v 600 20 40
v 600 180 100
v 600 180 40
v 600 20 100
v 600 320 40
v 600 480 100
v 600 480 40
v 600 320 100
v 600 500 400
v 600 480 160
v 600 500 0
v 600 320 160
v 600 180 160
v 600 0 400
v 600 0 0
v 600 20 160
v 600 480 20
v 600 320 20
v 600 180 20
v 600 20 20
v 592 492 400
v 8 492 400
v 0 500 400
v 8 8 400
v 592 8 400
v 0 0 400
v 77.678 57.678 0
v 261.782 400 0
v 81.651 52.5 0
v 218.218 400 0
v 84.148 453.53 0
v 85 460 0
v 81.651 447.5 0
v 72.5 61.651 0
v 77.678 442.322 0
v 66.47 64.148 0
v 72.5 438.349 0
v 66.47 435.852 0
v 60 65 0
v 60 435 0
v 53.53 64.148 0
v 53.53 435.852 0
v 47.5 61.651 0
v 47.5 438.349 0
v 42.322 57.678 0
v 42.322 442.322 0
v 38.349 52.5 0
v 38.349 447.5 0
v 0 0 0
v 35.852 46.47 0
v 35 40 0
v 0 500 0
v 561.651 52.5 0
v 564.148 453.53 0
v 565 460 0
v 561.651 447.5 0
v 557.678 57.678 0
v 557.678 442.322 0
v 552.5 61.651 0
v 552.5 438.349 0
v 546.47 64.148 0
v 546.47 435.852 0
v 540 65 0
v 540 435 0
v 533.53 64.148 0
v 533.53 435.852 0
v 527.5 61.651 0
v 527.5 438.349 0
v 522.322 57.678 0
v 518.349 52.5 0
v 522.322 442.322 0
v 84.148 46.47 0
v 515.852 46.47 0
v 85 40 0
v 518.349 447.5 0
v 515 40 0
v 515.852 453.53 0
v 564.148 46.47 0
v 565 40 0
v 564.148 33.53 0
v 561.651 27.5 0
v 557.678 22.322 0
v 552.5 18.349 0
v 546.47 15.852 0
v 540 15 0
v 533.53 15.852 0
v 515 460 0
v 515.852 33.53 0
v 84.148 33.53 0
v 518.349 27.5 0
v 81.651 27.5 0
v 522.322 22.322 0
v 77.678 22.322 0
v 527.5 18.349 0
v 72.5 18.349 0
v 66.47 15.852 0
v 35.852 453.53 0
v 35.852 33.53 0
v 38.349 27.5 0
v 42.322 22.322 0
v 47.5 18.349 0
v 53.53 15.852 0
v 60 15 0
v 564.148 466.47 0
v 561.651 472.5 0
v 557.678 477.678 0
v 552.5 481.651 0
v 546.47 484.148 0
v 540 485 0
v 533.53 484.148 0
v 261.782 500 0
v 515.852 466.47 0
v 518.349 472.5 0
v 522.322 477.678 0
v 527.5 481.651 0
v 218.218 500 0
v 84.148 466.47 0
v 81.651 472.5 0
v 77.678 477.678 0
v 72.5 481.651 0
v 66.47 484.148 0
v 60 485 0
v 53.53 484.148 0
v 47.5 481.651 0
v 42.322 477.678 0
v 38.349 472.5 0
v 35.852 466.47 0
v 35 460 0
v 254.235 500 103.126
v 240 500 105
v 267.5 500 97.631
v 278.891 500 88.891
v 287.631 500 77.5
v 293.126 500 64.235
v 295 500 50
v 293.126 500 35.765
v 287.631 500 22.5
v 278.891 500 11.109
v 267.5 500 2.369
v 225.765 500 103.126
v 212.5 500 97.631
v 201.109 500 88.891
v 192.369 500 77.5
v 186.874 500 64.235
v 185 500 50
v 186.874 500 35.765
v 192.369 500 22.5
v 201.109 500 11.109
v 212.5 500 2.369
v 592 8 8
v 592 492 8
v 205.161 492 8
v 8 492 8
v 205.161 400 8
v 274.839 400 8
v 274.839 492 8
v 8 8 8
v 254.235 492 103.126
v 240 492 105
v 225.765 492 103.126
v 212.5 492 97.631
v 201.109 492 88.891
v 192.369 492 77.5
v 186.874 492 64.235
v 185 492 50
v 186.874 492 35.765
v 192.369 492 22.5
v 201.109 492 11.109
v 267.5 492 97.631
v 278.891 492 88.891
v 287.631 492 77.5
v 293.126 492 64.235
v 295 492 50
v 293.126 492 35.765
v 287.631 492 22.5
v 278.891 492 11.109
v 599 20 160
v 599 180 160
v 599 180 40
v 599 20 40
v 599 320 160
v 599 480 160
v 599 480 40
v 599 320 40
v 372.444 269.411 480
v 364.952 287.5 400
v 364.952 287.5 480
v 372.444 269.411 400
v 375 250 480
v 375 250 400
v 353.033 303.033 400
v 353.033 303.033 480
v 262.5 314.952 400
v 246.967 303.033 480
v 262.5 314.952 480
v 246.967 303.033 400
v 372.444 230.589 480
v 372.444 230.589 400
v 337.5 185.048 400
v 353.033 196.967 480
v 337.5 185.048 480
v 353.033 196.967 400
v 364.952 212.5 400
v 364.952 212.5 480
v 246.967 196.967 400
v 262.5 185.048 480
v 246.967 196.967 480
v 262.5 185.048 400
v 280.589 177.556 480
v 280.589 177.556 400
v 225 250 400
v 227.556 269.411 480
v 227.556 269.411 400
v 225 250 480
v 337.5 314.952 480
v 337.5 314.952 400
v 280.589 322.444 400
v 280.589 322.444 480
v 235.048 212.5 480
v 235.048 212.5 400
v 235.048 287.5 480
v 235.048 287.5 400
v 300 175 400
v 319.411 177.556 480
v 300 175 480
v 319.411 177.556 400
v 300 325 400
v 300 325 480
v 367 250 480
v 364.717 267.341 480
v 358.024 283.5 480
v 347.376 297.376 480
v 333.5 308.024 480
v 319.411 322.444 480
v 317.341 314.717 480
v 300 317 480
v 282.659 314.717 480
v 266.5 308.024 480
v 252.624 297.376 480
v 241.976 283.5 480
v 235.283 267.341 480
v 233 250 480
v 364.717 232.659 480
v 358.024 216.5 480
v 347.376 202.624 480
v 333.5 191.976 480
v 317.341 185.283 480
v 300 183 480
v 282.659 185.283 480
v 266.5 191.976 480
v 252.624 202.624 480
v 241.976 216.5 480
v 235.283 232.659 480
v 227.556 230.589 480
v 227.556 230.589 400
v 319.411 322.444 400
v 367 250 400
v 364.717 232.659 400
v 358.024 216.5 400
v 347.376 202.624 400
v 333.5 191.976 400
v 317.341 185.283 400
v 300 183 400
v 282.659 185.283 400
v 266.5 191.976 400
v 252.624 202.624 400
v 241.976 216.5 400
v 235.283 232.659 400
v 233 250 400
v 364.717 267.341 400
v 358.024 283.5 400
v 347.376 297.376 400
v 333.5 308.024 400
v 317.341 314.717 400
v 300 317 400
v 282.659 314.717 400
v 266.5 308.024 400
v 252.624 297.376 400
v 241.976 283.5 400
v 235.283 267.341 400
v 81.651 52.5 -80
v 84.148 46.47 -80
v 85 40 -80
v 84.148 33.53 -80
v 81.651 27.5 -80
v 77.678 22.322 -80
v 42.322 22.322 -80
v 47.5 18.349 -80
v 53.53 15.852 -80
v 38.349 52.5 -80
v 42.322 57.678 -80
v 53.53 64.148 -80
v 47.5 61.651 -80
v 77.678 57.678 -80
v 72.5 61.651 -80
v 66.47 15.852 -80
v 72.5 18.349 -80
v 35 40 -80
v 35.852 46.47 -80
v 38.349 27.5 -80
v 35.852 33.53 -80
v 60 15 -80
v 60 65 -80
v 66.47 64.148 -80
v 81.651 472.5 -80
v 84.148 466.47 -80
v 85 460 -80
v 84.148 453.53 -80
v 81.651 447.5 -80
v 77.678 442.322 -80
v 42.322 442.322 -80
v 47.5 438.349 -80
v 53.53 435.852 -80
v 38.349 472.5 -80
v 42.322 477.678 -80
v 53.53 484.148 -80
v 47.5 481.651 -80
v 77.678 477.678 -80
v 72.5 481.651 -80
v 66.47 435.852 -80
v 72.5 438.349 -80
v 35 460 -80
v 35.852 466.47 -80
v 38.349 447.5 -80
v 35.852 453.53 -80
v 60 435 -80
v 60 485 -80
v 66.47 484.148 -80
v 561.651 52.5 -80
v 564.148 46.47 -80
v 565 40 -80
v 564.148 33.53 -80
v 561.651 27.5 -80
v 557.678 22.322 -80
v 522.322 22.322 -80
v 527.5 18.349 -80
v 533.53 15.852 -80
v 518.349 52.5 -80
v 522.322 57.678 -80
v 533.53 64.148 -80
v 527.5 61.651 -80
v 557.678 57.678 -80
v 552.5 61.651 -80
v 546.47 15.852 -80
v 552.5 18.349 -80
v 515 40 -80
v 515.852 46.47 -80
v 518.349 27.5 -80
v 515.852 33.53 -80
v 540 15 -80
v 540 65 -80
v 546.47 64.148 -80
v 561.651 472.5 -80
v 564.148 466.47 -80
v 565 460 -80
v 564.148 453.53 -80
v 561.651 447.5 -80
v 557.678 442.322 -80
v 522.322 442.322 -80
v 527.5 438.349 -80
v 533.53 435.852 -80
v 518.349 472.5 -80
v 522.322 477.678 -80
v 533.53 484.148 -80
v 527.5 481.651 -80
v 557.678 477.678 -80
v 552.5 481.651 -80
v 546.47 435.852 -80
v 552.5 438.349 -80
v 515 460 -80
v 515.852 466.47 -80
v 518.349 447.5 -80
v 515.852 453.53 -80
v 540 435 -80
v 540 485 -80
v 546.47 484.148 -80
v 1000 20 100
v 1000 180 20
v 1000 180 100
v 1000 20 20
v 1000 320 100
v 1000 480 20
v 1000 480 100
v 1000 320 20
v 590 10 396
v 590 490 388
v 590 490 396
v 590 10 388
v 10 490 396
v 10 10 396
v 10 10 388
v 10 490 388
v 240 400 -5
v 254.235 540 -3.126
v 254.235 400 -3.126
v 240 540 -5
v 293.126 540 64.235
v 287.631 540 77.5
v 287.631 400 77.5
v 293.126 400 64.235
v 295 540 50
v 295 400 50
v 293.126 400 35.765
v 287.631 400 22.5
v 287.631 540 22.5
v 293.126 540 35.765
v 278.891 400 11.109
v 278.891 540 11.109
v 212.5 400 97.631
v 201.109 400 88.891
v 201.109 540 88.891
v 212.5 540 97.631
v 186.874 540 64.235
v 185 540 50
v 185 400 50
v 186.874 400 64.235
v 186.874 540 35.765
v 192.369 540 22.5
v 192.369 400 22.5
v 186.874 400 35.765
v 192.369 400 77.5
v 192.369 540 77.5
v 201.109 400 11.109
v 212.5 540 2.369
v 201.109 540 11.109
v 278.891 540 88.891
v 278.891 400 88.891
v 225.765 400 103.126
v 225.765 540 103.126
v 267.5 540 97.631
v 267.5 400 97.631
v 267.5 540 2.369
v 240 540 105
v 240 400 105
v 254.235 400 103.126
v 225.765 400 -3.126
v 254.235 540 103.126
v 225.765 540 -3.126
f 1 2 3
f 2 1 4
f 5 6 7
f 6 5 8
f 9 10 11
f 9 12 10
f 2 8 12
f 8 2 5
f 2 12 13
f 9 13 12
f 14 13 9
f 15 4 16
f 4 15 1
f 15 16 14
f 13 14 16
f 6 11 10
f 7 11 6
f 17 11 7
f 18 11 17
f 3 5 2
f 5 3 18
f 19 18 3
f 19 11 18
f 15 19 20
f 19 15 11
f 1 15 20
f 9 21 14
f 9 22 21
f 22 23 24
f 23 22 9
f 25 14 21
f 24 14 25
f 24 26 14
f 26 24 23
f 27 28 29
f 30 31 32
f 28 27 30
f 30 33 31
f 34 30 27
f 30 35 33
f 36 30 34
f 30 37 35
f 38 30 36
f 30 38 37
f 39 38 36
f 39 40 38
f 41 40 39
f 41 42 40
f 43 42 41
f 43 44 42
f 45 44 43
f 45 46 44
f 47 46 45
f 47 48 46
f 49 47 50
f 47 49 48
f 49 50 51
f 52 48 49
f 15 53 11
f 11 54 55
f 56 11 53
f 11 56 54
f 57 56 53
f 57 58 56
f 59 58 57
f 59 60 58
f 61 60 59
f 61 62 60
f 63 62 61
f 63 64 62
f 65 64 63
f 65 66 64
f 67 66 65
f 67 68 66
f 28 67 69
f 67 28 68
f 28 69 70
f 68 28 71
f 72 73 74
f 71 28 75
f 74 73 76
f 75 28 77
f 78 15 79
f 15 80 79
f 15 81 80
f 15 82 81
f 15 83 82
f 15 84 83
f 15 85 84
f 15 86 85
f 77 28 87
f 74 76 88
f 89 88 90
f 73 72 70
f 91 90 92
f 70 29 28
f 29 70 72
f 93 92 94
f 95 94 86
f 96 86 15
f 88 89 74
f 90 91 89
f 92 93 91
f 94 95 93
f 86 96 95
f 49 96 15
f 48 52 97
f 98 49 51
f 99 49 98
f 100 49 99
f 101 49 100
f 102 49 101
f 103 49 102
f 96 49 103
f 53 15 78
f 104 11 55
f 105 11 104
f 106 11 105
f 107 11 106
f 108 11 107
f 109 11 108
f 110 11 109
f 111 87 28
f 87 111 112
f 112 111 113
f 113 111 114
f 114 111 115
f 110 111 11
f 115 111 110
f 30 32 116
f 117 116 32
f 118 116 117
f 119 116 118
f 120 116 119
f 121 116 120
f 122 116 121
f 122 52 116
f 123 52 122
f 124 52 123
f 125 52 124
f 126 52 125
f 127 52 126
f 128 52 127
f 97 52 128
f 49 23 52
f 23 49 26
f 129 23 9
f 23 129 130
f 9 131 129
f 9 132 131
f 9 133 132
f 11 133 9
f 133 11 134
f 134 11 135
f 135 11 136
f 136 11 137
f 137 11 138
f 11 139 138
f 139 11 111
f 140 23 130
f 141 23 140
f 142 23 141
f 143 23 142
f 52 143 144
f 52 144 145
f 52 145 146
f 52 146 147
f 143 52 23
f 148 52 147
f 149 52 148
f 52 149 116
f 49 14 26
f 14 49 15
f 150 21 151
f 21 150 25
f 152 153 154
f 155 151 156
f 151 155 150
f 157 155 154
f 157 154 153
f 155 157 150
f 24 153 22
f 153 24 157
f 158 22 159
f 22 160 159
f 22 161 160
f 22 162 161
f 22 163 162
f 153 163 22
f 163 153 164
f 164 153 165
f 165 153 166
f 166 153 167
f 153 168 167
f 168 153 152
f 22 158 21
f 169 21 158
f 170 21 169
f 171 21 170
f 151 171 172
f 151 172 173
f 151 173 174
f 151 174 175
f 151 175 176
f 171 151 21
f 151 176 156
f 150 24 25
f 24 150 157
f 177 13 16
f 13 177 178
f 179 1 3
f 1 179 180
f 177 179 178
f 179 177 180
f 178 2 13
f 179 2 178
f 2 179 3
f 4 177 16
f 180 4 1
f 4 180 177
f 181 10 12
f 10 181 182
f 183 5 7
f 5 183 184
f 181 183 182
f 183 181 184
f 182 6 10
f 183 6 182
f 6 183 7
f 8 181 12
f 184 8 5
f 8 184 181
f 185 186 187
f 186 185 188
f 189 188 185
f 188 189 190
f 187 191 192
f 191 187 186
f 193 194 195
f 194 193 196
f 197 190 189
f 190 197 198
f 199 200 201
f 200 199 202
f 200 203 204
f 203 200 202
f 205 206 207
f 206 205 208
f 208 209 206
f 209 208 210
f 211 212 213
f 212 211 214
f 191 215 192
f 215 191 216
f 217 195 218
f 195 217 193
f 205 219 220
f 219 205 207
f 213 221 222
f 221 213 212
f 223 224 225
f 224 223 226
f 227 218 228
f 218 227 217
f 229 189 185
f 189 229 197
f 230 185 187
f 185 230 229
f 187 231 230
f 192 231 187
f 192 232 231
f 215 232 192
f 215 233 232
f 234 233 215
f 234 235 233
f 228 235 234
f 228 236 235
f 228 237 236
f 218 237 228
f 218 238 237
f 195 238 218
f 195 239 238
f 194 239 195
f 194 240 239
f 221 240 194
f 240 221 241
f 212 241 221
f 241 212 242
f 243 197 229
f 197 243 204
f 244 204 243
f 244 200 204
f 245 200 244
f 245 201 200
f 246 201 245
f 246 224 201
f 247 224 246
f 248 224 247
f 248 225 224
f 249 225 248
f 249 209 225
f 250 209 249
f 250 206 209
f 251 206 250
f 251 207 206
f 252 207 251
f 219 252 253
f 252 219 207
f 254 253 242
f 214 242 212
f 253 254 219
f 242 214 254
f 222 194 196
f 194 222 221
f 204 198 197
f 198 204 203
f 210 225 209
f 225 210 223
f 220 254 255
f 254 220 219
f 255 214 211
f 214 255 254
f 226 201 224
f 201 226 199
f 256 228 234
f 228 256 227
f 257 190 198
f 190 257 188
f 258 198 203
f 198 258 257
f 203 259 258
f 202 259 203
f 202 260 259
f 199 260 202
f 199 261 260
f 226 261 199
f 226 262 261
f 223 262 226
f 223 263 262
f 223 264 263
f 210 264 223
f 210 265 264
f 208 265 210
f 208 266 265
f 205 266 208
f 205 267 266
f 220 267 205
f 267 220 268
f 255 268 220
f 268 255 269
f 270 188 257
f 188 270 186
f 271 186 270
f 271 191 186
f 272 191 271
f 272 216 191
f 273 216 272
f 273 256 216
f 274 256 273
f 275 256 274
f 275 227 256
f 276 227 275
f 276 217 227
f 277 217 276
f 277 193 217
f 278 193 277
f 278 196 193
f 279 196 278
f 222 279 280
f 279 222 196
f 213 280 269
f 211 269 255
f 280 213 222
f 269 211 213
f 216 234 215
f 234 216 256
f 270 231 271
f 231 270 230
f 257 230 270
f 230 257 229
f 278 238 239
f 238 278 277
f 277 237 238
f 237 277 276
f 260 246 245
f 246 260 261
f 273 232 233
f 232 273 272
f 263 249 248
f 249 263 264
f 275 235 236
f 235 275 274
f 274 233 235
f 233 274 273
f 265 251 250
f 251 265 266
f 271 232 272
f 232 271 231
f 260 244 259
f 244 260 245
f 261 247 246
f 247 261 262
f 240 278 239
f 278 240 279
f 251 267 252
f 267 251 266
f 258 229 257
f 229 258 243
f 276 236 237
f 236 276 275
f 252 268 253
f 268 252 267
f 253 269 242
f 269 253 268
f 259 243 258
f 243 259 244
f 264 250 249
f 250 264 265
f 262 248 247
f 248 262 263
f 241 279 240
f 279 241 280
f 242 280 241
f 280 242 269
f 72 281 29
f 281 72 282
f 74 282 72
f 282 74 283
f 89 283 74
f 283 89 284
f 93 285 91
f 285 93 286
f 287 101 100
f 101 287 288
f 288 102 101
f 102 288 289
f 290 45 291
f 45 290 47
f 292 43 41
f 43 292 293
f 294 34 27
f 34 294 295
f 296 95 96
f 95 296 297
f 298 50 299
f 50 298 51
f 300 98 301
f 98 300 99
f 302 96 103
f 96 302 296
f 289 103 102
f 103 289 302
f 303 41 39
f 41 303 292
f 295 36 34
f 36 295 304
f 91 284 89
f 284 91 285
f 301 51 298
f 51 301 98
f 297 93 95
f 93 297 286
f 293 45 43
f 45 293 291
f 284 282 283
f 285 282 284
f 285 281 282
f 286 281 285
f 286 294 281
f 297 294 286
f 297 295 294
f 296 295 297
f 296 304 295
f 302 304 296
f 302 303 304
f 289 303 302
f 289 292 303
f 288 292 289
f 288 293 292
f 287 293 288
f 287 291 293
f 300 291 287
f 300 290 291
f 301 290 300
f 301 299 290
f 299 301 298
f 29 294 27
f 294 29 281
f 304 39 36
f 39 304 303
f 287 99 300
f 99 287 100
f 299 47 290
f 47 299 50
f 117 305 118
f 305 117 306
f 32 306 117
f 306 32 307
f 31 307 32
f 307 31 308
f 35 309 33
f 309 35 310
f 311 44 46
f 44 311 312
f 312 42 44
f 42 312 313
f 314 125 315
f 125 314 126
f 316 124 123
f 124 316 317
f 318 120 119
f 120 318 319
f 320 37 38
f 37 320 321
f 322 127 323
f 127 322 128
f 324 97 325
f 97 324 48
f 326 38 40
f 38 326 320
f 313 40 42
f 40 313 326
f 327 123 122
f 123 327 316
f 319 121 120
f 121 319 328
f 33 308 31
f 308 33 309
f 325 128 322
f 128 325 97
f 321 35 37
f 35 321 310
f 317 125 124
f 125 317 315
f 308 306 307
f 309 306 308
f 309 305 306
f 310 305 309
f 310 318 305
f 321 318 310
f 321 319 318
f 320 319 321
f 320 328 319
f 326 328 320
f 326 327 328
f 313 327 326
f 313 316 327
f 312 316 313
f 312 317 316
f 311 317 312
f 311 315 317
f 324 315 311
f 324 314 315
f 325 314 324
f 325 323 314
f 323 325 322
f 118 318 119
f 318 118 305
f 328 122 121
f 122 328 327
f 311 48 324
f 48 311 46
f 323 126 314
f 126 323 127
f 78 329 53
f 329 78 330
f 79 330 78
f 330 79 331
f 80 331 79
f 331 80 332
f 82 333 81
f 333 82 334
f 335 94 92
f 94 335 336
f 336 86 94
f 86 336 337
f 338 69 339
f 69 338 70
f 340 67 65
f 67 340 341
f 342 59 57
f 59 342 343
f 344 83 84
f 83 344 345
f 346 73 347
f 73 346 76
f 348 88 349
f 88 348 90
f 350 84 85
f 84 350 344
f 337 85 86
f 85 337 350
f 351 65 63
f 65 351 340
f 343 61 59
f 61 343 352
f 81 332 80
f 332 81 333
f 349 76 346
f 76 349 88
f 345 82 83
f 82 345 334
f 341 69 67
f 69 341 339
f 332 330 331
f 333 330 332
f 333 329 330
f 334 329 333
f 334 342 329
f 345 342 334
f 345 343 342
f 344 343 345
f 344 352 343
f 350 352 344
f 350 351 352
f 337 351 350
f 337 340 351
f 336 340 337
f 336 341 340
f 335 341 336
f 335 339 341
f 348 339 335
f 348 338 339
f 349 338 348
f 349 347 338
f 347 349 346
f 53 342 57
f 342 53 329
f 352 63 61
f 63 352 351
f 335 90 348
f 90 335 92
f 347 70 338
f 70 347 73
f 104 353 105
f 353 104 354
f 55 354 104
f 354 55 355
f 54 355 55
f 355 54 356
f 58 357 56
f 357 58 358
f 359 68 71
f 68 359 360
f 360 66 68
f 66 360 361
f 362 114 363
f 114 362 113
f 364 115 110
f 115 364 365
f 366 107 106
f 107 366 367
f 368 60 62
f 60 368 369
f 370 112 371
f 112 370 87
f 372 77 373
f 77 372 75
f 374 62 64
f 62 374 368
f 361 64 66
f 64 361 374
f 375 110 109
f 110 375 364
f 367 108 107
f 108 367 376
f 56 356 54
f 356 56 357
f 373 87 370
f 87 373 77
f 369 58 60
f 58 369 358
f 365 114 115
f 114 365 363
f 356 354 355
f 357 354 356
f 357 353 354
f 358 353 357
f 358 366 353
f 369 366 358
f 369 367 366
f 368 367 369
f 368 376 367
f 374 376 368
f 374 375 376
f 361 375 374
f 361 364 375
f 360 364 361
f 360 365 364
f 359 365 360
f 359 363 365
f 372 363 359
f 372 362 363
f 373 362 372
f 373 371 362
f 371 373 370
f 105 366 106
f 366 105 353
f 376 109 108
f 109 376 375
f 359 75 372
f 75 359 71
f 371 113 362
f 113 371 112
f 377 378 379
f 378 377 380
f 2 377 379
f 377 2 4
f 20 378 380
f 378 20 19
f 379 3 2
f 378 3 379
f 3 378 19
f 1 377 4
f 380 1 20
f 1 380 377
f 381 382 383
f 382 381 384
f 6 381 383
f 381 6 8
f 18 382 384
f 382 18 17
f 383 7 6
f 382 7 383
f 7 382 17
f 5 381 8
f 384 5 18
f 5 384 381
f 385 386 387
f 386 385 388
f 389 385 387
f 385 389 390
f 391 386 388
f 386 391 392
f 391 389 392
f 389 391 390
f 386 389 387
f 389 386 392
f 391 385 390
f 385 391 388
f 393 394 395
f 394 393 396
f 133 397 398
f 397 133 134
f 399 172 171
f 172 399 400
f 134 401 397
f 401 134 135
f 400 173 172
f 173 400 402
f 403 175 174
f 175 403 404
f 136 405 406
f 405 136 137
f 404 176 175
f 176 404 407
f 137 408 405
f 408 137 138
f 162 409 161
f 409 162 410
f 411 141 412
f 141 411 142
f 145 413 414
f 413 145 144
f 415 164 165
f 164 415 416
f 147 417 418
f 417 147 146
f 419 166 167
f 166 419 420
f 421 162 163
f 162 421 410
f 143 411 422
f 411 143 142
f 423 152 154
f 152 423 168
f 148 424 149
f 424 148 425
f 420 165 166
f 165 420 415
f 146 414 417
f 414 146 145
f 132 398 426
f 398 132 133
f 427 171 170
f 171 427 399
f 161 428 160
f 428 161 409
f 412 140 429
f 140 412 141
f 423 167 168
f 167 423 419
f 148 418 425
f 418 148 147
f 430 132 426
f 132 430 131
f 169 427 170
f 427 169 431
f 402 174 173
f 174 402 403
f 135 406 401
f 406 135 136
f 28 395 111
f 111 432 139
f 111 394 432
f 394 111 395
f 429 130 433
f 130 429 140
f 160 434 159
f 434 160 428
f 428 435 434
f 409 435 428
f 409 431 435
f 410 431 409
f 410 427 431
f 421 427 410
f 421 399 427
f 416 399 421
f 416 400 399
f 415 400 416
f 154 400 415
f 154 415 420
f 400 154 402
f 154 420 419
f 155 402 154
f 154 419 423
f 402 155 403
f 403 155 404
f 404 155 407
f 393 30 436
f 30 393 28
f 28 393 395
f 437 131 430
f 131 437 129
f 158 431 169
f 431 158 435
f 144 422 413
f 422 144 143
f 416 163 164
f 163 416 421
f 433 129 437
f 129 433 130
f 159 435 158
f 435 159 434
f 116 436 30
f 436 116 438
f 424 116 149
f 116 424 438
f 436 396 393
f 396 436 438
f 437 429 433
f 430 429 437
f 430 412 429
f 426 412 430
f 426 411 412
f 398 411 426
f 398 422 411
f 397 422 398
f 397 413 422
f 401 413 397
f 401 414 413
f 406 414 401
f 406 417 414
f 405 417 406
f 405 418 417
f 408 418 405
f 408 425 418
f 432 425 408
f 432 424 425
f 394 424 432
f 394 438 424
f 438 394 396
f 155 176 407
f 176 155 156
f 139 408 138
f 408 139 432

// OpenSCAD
// file: ../params.scad
// Shared millimetre parameters. Keep in lockstep with freecad/params.py.
// Module scale: 150 kg/day wet train. Walls are CPVC sheet, not metal.

$fn = 36;

WALL        = 12;     // CPVC sheet thickness
FLOOR       = 16;     // floor plate (trough sits on this)

// LEACH CSTR 1 — inside liquor box
CSTR_L      = 2000;
CSTR_W      = 1200;
CSTR_H      = 1400;   // liquid + freeboard
FREEBOARD   = 200;

// CSTR 2 weir (same vessel, +X wall)
WEIR_W      = 450;
WEIR_CREST  = CSTR_H - FREEBOARD;   // from inner floor
WEIR_SLOT_H = 80;
WEIR_LIP    = 120;    // external spout projection

// CSTR 3 floor auger — injection-molded PVC / FG
AUGER_D     = 140;    // flight OD
AUGER_SHAFT = 40;
AUGER_PITCH = 110;
AUGER_TROUGH_W = 180;
AUGER_TROUGH_H = 110;
AUGER_OFFSET_Y = 280; // trough centreline from inner -Y wall
AUGER_INCLINE  = 28;  // deg, lifts out of liquor toward +X

// mixer / nozzles (lid)
MIXER_D     = 50;
GAS_D       = 80;     // acid-gas takeoff
DROP_X      = 80;     // inner-X of shred drop slot
DROP_L      = 400;
DROP_W      = 250;
DROP_COAM   = 80;     // raised coaming around the slot

// LEACHATE PUMP / coarse strainer — −X wall, opposite the weir
PUMP_D      = 80;     // DN80
PUMP_Z      = 450;    // centreline above inner floor (submerged)
PUMP_Y      = 900;    // centreline from inner −Y (away from auger)
STRAINER_L  = 180;
STRAINER_W  = 140;
STRAINER_H  = 160;

// mezzanine feed train
MEZZ_H      = 2200;   // platform top above tank outer floor
MEZZ_L      = 1600;   // platform length in −X
MEZZ_THK    = 12;
HOPPER_L    = 700;
HOPPER_W    = 600;
HOPPER_H    = 800;
SHRED_L     = 500;
SHRED_W     = 500;
SHRED_H     = 450;
CONV_W      = 240;
CONV_H      = 120;
CONV_PLATE  = 6;      // trough plate
CONV_FLANGE = 40;
CONV_SPRING_D = 50;
CONV_SPRING_H = 80;
CONV_BOLT   = 10;     // M10 clearance
CONV_LEN    = 1800;   // default standalone length; plant instance is computed
DUST_D      = 150;    // dust-hood outlet to DUST header
AUGER_LIFT_L = 700;

// dewater belts + split (Phase A 4–6)
FDEW_L      = 1800;
FDEW_W      = 450;
FDEW_H      = 80;
FDEW_RISE   = 120;    // solids end higher so liquor runs back to weir
SDEW_L      = 1400;
SDEW_W      = 220;
SDEW_H      = 80;
SPLIT_L     = 600;
SPLIT_W     = 500;
SPLIT_H     = 400;
STUB_L      = 400;
STUB_W      = 300;
STUB_H      = 250;

// EW funnel cell
EW_L        = 600;    // along aisle (overflow direction)
EW_W        = 420;    // anode-cathode depth
EW_H        = 650;    // rectangular body
EW_FUNNEL_H = 220;
EW_VALVE_D  = 50;
EW_VALVE_L  = 60;
EW_MEM_T    = 4;      // CEM
EW_SLOT     = 10;     // membrane cassette slot
EW_PITCH    = 750;    // aisle spacing, centre to centre
AISLE_X0    = 200;
AISLE_Y     = -(EW_W + 2*WALL) - 400;
AISLE_Z     = 400;
BUND_H      = 150;
BUND_PAD    = 250;
SUMP_L      = 400;
SUMP_W      = 400;
SUMP_H      = 300;
VDF_D       = 700;
VDF_L       = 900;
PAIL_W      = 180;
HDR_D       = 80;
HDR_Z       = 1400;
PYRO_D      = 320;
PYRO_L      = 2800;

// Campus envelopes — lockstep with freecad/params.py
FARM_X=12000; FARM_Y=8000; FARM_L=12000; FARM_W=8000; FARM_H=4500;
FAB_X=12000;  FAB_Y=-6000; FAB_L=8000;   FAB_W=6000;  FAB_H=4000;
HAB_X=-8000;  HAB_Y=8000;  HAB_L=8000;   HAB_W=6000;  HAB_H=3200;
CRYO_X=-6000; CRYO_Y=-4000; CRYO_L=4000; CRYO_W=3000; CRYO_H=3000;
MFG_X=2000;   MFG_Y=9000;  MFG_L=6000;   MFG_W=4000;  MFG_H=3500;

LIFE_Z_GREY=900; LIFE_Z_UPW=1100; LIFE_Z_ETCH=1300;
LIFE_Z_O2=2800; LIFE_Z_N2=3000; LIFE_Z_CO2=3200;
LIFE_D_GREY=50; LIFE_D_UPW=40; LIFE_D_ETCH=32;
LIFE_D_GAS=25; LIFE_D_CO2=40;
// main file
// VIBRATORY SPLIT — after SINK DEWATER only.
// Dense plastic → OIL LINE stub. Grit / FR-4 / glass → GLASS / CERAMIC stub.
// Wetted CPVC. Dust cover taps HDR_DUST (negative). No FR-4 to pyro.
include <../params.scad>;
$fn = 24;

module mfg_vibratory_split() {
    difference() {
        cube([SPLIT_L, SPLIT_W, SPLIT_H]);
        translate([8, 8, 8])
            cube([SPLIT_L-16, SPLIT_W-16, SPLIT_H]);
        translate([SPLIT_L-1, 20, 40]) cube([12, 160, 120]);
        translate([SPLIT_L-1, SPLIT_W-180, 40]) cube([12, 160, 120]);
    }
    translate([SPLIT_L, 20, 20]) cube([STUB_L, 160, 80]);
    translate([SPLIT_L, SPLIT_W-180, 20]) cube([STUB_L, 160, 80]);
    translate([10, 10, SPLIT_H-12]) cube([SPLIT_L-20, SPLIT_W-20, 8]);
    translate([SPLIT_L/2, SPLIT_W/2, SPLIT_H])
        difference() {
            cylinder(h=80, d=DUST_D);
            translate([0, 0, -1]) cylinder(h=82, d=DUST_D-16);
        }
    for (x = [60, SPLIT_L-60])
        for (y = [40, SPLIT_W-40])
            translate([x, y, -CONV_SPRING_H])
                cylinder(h=CONV_SPRING_H, d=CONV_SPRING_D);
    translate([SPLIT_L*0.4, SPLIT_W+40, 50])
        rotate([90, 0, 0]) cylinder(h=140, d=110);
}

mfg_vibratory_split();
